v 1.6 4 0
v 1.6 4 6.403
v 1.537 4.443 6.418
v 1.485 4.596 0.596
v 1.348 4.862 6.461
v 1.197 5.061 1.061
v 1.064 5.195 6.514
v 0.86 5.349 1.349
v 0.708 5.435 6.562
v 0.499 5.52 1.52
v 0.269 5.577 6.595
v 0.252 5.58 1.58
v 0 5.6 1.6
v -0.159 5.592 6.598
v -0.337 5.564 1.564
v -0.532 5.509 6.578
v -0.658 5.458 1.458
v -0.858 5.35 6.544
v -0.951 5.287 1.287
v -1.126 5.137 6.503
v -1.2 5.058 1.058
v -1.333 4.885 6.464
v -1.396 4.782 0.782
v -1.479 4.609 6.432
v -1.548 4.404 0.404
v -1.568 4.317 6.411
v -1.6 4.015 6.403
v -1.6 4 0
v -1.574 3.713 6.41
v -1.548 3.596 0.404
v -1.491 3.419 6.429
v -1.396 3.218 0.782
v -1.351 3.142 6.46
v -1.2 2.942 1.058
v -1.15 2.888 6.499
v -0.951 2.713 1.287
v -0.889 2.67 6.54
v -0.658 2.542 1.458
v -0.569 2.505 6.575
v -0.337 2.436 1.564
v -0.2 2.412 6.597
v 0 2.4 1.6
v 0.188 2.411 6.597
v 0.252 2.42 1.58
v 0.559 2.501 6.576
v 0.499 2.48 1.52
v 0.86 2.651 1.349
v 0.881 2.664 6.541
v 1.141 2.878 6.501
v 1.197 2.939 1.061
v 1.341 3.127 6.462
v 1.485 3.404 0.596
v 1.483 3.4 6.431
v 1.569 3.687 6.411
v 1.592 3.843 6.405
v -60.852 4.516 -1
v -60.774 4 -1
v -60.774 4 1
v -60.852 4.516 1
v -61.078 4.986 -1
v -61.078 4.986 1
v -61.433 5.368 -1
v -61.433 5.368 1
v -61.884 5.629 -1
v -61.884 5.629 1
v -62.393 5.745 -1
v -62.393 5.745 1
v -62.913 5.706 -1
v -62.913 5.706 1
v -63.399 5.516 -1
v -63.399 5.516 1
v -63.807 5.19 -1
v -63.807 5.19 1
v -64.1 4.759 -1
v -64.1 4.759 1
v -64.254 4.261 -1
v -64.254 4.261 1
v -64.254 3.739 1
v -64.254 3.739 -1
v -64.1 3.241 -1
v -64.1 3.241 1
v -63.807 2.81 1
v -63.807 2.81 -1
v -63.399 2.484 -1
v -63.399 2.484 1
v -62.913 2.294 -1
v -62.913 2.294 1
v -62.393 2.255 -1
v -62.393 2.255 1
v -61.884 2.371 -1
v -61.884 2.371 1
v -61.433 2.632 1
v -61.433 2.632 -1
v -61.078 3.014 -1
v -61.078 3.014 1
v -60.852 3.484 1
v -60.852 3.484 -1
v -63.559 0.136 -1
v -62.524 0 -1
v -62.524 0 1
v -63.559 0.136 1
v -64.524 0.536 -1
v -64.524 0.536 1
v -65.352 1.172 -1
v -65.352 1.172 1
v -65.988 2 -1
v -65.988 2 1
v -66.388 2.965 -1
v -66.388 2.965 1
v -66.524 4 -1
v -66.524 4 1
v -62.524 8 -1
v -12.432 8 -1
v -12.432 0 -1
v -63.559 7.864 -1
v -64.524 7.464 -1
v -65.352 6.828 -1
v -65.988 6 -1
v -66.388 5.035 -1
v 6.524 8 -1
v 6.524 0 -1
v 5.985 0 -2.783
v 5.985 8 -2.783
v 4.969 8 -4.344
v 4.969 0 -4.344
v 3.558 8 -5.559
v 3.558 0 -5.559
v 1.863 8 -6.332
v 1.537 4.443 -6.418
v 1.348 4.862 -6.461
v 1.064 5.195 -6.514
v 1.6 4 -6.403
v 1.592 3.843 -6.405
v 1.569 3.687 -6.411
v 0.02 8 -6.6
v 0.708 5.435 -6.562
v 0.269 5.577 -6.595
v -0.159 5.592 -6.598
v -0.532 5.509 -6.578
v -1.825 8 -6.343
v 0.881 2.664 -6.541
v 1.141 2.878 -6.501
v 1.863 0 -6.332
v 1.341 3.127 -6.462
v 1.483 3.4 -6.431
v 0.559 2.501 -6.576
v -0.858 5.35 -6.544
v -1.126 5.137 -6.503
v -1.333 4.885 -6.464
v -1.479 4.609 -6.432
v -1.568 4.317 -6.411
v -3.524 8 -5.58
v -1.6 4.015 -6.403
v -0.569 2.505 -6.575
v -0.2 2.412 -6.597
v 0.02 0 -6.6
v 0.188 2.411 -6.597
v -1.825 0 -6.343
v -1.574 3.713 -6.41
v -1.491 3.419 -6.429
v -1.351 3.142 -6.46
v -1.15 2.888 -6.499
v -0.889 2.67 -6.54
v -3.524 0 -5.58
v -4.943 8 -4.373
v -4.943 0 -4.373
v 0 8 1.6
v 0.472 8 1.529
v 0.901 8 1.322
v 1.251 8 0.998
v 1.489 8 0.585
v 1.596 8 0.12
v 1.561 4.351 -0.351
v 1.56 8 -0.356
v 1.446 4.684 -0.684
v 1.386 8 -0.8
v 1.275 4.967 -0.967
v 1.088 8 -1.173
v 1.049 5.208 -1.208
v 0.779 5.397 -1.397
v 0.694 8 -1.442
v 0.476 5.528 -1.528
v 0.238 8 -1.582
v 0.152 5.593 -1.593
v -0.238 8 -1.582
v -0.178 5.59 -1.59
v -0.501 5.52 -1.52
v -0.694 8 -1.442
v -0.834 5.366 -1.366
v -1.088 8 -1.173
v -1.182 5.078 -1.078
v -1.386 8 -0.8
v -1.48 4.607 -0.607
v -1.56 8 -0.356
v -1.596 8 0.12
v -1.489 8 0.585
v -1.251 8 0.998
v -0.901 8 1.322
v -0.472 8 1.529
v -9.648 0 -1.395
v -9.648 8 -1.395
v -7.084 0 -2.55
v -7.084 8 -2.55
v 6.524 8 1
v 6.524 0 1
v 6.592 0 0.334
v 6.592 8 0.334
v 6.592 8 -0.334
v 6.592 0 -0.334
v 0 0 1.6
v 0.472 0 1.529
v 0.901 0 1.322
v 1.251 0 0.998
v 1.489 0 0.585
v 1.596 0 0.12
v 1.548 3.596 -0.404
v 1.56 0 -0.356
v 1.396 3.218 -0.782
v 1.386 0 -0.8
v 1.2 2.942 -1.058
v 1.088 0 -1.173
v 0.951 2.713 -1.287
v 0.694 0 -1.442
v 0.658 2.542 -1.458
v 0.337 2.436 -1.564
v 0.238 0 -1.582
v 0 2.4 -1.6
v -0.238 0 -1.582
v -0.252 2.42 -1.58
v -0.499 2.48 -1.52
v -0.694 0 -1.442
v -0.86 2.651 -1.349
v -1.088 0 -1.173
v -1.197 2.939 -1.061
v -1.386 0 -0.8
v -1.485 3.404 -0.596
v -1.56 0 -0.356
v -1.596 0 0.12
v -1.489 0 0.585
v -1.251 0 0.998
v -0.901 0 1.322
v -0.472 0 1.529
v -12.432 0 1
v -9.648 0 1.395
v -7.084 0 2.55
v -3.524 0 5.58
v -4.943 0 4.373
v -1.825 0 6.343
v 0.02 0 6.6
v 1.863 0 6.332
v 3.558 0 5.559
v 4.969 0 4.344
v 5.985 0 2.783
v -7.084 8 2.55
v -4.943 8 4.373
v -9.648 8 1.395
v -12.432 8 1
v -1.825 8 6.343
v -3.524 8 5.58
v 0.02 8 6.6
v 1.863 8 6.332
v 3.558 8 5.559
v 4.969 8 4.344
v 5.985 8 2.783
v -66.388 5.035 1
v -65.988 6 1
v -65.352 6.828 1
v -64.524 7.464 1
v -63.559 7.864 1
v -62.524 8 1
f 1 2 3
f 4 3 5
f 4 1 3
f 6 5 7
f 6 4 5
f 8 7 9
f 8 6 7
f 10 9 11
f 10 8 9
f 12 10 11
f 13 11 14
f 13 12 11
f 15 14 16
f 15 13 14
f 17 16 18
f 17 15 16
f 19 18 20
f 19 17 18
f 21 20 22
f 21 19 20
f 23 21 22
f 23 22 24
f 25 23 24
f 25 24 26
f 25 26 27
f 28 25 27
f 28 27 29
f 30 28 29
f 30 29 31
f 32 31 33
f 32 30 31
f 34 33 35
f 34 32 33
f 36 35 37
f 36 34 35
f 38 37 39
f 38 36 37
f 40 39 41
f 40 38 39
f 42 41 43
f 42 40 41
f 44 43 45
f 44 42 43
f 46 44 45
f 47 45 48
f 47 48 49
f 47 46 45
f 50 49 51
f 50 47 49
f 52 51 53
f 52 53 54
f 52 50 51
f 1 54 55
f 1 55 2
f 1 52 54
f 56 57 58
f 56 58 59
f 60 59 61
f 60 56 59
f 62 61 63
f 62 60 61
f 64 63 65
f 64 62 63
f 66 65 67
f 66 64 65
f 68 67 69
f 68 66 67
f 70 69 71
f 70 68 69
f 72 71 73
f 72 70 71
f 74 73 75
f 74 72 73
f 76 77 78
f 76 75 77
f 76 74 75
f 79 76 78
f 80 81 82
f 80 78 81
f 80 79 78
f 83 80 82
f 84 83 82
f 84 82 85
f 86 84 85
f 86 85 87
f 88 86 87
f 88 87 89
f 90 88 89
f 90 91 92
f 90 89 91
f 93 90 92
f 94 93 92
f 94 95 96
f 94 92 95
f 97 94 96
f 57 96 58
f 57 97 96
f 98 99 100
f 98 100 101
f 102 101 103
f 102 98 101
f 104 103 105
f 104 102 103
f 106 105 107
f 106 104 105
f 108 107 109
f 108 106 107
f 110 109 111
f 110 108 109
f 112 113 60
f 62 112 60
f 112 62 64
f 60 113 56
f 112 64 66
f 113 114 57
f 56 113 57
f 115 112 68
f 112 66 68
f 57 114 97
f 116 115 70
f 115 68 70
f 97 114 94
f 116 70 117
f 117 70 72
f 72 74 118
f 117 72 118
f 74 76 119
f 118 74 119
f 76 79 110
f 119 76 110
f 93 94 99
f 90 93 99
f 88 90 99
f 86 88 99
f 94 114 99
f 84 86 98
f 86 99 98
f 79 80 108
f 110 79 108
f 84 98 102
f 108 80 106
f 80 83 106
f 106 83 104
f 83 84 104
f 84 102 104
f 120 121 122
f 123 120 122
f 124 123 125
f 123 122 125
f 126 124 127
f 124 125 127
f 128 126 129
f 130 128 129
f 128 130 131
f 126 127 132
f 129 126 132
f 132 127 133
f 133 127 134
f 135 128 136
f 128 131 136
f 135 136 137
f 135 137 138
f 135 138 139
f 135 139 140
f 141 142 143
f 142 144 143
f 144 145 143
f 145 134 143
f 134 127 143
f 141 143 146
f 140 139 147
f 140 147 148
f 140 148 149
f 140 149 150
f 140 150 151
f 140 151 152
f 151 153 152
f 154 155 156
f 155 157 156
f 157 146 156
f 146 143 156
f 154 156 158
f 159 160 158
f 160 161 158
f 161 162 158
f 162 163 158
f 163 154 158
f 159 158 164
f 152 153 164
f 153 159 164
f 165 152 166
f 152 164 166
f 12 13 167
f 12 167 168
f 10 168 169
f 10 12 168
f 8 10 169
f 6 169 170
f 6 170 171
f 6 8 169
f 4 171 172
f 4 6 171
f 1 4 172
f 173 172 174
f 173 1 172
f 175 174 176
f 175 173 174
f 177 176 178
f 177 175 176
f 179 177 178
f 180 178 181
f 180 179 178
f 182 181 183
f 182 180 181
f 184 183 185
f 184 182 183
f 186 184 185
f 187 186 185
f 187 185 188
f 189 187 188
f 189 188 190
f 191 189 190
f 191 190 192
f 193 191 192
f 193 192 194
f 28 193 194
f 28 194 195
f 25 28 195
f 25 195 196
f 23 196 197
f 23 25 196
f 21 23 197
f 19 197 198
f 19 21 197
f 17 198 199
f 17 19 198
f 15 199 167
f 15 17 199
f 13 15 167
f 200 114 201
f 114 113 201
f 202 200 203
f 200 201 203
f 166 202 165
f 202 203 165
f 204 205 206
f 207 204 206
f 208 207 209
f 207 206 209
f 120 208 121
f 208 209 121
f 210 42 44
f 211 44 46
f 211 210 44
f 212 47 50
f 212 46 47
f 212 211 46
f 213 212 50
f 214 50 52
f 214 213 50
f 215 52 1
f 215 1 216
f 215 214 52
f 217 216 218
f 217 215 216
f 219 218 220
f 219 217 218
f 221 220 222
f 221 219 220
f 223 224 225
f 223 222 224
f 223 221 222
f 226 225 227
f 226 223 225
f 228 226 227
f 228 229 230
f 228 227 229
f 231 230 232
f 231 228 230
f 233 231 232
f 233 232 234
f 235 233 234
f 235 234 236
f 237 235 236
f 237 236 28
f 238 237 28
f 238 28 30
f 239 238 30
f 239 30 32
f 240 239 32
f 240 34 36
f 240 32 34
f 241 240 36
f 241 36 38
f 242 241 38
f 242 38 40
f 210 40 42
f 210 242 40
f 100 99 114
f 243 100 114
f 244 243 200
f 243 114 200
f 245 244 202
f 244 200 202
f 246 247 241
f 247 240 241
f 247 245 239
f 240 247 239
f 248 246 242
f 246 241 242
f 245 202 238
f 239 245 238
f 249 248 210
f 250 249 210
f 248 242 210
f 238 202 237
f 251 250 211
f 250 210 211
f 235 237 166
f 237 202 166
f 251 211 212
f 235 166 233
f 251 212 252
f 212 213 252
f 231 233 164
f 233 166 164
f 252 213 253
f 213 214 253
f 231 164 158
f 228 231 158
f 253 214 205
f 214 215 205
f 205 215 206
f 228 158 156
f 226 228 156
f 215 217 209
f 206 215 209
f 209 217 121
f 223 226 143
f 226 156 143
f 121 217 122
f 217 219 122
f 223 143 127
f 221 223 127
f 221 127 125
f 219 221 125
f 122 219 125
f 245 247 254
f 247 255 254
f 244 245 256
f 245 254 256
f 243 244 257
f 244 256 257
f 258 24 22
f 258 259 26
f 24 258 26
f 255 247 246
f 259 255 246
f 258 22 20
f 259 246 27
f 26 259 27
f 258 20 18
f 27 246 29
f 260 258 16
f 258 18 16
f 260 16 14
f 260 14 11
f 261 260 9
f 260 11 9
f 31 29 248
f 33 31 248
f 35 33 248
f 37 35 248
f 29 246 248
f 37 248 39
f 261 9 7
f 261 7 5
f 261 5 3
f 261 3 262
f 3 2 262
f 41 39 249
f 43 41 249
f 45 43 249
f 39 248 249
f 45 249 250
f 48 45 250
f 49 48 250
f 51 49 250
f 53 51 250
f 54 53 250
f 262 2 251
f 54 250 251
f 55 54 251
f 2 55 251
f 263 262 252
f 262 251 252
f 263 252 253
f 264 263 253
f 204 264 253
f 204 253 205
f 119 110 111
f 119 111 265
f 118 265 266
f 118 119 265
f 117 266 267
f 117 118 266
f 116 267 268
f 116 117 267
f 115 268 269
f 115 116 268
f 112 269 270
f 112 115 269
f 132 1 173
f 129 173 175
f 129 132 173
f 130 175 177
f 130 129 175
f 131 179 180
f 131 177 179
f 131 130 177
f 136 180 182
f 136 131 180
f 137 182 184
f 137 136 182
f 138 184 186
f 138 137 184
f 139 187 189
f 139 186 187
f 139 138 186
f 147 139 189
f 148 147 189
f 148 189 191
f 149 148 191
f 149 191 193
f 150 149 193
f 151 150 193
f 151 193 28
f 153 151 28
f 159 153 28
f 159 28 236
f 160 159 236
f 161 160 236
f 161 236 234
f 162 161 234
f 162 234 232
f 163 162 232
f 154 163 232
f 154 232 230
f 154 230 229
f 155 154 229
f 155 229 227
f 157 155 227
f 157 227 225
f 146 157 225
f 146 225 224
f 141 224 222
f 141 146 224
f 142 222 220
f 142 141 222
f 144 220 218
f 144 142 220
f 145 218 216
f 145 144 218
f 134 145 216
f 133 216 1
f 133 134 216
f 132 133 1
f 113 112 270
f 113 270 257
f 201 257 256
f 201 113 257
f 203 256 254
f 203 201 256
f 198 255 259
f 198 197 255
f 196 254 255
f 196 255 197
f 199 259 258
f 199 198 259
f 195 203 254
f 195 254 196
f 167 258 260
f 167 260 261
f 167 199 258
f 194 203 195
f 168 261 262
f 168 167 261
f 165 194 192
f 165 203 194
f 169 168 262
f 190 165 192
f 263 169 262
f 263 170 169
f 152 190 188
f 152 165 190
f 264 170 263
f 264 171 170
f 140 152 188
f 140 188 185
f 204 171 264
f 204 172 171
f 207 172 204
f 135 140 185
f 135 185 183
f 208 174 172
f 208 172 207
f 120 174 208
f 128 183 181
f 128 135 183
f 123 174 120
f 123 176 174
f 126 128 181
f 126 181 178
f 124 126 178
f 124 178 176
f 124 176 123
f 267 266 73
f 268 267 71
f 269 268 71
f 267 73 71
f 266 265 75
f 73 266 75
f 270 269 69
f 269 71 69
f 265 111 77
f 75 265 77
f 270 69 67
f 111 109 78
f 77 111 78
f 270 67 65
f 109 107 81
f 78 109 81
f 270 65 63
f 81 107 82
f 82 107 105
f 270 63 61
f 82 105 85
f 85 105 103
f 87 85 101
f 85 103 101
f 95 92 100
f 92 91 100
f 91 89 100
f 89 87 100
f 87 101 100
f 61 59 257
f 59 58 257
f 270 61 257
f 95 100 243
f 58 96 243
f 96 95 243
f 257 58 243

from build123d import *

# Parameters (mm, degrees)
SKETCH1_R               = 1.6
BOSS_EXTRUDE1_DEPTH     = 8
CUT_EXTRUDE1_DEPTH      = 68.432753975
CUT_EXTRUDE1_DEPTH_BACK = 68.432753975
SKETCH2_R               = 1.75
SKETCH2_R_2             = 1.6
FILLET1_R               = 10


with BuildPart() as part:
    # Sketch1 → Boss-Extrude1 (new body)
    with BuildSketch(Plane(origin=(0, 0, 0), x_dir=(1, 0, 0), z_dir=(0, 1, 0))):
        with BuildLine():
            Line((-6.523802572, 1), (-66.523802572, 1))
            Line((-66.523802572, 1), (-66.523802572, -1))
            Line((-66.523802572, -1), (-6.523802572, -1))
            ThreePointArc((-6.523802572, -1), (0, -6.6), (6.523802572, -1))
            ThreePointArc((6.523802572, -1), (6.6, 0), (6.523802572, 1))
            ThreePointArc((6.523802572, 1), (0, 6.6), (-6.523802572, 1))
        make_face()
        with Locations(Location((0, 0, 0), (0, 0, 270))):
            Circle(SKETCH1_R, mode=Mode.SUBTRACT)
    extrude(amount=BOSS_EXTRUDE1_DEPTH)

    # Sketch2 → Cut-Extrude1 (cut, two sides: drawn at the far end of the back side and taken through both)
    with BuildSketch(Plane.XY.offset(1).offset(-CUT_EXTRUDE1_DEPTH_BACK)):
        with BuildLine():
            Line((-66.523802572, 8), (-66.523802572, 4))
            ThreePointArc((-66.523802572, 4), (-65.352229697, 6.828427125), (-62.523802572, 8))
            Line((-62.523802572, 8), (-66.523802572, 8))
        make_face()
        with BuildLine():
            Line((-66.523802572, 4), (-66.523802572, 0))
            Line((-66.523802572, 0), (-62.523802572, 0))
            ThreePointArc((-62.523802572, 0), (-65.352229697, 1.171572875), (-66.523802572, 4))
        make_face()
        with Locations((-62.523802572, 4)):
            Circle(SKETCH2_R)
        with Locations((0, 4)):
            Circle(SKETCH2_R_2)
    extrude(amount=CUT_EXTRUDE1_DEPTH + CUT_EXTRUDE1_DEPTH_BACK, mode=Mode.SUBTRACT)

    # Fillet1
    fillet1_edges = [part.edges().sort_by_distance(p)[0] for p in [
        (-6.523802572, 4, 1),
        (-6.523802572, 4, -1),
    ]]
    fillet(fillet1_edges, radius=FILLET1_R)


solid = part.part
